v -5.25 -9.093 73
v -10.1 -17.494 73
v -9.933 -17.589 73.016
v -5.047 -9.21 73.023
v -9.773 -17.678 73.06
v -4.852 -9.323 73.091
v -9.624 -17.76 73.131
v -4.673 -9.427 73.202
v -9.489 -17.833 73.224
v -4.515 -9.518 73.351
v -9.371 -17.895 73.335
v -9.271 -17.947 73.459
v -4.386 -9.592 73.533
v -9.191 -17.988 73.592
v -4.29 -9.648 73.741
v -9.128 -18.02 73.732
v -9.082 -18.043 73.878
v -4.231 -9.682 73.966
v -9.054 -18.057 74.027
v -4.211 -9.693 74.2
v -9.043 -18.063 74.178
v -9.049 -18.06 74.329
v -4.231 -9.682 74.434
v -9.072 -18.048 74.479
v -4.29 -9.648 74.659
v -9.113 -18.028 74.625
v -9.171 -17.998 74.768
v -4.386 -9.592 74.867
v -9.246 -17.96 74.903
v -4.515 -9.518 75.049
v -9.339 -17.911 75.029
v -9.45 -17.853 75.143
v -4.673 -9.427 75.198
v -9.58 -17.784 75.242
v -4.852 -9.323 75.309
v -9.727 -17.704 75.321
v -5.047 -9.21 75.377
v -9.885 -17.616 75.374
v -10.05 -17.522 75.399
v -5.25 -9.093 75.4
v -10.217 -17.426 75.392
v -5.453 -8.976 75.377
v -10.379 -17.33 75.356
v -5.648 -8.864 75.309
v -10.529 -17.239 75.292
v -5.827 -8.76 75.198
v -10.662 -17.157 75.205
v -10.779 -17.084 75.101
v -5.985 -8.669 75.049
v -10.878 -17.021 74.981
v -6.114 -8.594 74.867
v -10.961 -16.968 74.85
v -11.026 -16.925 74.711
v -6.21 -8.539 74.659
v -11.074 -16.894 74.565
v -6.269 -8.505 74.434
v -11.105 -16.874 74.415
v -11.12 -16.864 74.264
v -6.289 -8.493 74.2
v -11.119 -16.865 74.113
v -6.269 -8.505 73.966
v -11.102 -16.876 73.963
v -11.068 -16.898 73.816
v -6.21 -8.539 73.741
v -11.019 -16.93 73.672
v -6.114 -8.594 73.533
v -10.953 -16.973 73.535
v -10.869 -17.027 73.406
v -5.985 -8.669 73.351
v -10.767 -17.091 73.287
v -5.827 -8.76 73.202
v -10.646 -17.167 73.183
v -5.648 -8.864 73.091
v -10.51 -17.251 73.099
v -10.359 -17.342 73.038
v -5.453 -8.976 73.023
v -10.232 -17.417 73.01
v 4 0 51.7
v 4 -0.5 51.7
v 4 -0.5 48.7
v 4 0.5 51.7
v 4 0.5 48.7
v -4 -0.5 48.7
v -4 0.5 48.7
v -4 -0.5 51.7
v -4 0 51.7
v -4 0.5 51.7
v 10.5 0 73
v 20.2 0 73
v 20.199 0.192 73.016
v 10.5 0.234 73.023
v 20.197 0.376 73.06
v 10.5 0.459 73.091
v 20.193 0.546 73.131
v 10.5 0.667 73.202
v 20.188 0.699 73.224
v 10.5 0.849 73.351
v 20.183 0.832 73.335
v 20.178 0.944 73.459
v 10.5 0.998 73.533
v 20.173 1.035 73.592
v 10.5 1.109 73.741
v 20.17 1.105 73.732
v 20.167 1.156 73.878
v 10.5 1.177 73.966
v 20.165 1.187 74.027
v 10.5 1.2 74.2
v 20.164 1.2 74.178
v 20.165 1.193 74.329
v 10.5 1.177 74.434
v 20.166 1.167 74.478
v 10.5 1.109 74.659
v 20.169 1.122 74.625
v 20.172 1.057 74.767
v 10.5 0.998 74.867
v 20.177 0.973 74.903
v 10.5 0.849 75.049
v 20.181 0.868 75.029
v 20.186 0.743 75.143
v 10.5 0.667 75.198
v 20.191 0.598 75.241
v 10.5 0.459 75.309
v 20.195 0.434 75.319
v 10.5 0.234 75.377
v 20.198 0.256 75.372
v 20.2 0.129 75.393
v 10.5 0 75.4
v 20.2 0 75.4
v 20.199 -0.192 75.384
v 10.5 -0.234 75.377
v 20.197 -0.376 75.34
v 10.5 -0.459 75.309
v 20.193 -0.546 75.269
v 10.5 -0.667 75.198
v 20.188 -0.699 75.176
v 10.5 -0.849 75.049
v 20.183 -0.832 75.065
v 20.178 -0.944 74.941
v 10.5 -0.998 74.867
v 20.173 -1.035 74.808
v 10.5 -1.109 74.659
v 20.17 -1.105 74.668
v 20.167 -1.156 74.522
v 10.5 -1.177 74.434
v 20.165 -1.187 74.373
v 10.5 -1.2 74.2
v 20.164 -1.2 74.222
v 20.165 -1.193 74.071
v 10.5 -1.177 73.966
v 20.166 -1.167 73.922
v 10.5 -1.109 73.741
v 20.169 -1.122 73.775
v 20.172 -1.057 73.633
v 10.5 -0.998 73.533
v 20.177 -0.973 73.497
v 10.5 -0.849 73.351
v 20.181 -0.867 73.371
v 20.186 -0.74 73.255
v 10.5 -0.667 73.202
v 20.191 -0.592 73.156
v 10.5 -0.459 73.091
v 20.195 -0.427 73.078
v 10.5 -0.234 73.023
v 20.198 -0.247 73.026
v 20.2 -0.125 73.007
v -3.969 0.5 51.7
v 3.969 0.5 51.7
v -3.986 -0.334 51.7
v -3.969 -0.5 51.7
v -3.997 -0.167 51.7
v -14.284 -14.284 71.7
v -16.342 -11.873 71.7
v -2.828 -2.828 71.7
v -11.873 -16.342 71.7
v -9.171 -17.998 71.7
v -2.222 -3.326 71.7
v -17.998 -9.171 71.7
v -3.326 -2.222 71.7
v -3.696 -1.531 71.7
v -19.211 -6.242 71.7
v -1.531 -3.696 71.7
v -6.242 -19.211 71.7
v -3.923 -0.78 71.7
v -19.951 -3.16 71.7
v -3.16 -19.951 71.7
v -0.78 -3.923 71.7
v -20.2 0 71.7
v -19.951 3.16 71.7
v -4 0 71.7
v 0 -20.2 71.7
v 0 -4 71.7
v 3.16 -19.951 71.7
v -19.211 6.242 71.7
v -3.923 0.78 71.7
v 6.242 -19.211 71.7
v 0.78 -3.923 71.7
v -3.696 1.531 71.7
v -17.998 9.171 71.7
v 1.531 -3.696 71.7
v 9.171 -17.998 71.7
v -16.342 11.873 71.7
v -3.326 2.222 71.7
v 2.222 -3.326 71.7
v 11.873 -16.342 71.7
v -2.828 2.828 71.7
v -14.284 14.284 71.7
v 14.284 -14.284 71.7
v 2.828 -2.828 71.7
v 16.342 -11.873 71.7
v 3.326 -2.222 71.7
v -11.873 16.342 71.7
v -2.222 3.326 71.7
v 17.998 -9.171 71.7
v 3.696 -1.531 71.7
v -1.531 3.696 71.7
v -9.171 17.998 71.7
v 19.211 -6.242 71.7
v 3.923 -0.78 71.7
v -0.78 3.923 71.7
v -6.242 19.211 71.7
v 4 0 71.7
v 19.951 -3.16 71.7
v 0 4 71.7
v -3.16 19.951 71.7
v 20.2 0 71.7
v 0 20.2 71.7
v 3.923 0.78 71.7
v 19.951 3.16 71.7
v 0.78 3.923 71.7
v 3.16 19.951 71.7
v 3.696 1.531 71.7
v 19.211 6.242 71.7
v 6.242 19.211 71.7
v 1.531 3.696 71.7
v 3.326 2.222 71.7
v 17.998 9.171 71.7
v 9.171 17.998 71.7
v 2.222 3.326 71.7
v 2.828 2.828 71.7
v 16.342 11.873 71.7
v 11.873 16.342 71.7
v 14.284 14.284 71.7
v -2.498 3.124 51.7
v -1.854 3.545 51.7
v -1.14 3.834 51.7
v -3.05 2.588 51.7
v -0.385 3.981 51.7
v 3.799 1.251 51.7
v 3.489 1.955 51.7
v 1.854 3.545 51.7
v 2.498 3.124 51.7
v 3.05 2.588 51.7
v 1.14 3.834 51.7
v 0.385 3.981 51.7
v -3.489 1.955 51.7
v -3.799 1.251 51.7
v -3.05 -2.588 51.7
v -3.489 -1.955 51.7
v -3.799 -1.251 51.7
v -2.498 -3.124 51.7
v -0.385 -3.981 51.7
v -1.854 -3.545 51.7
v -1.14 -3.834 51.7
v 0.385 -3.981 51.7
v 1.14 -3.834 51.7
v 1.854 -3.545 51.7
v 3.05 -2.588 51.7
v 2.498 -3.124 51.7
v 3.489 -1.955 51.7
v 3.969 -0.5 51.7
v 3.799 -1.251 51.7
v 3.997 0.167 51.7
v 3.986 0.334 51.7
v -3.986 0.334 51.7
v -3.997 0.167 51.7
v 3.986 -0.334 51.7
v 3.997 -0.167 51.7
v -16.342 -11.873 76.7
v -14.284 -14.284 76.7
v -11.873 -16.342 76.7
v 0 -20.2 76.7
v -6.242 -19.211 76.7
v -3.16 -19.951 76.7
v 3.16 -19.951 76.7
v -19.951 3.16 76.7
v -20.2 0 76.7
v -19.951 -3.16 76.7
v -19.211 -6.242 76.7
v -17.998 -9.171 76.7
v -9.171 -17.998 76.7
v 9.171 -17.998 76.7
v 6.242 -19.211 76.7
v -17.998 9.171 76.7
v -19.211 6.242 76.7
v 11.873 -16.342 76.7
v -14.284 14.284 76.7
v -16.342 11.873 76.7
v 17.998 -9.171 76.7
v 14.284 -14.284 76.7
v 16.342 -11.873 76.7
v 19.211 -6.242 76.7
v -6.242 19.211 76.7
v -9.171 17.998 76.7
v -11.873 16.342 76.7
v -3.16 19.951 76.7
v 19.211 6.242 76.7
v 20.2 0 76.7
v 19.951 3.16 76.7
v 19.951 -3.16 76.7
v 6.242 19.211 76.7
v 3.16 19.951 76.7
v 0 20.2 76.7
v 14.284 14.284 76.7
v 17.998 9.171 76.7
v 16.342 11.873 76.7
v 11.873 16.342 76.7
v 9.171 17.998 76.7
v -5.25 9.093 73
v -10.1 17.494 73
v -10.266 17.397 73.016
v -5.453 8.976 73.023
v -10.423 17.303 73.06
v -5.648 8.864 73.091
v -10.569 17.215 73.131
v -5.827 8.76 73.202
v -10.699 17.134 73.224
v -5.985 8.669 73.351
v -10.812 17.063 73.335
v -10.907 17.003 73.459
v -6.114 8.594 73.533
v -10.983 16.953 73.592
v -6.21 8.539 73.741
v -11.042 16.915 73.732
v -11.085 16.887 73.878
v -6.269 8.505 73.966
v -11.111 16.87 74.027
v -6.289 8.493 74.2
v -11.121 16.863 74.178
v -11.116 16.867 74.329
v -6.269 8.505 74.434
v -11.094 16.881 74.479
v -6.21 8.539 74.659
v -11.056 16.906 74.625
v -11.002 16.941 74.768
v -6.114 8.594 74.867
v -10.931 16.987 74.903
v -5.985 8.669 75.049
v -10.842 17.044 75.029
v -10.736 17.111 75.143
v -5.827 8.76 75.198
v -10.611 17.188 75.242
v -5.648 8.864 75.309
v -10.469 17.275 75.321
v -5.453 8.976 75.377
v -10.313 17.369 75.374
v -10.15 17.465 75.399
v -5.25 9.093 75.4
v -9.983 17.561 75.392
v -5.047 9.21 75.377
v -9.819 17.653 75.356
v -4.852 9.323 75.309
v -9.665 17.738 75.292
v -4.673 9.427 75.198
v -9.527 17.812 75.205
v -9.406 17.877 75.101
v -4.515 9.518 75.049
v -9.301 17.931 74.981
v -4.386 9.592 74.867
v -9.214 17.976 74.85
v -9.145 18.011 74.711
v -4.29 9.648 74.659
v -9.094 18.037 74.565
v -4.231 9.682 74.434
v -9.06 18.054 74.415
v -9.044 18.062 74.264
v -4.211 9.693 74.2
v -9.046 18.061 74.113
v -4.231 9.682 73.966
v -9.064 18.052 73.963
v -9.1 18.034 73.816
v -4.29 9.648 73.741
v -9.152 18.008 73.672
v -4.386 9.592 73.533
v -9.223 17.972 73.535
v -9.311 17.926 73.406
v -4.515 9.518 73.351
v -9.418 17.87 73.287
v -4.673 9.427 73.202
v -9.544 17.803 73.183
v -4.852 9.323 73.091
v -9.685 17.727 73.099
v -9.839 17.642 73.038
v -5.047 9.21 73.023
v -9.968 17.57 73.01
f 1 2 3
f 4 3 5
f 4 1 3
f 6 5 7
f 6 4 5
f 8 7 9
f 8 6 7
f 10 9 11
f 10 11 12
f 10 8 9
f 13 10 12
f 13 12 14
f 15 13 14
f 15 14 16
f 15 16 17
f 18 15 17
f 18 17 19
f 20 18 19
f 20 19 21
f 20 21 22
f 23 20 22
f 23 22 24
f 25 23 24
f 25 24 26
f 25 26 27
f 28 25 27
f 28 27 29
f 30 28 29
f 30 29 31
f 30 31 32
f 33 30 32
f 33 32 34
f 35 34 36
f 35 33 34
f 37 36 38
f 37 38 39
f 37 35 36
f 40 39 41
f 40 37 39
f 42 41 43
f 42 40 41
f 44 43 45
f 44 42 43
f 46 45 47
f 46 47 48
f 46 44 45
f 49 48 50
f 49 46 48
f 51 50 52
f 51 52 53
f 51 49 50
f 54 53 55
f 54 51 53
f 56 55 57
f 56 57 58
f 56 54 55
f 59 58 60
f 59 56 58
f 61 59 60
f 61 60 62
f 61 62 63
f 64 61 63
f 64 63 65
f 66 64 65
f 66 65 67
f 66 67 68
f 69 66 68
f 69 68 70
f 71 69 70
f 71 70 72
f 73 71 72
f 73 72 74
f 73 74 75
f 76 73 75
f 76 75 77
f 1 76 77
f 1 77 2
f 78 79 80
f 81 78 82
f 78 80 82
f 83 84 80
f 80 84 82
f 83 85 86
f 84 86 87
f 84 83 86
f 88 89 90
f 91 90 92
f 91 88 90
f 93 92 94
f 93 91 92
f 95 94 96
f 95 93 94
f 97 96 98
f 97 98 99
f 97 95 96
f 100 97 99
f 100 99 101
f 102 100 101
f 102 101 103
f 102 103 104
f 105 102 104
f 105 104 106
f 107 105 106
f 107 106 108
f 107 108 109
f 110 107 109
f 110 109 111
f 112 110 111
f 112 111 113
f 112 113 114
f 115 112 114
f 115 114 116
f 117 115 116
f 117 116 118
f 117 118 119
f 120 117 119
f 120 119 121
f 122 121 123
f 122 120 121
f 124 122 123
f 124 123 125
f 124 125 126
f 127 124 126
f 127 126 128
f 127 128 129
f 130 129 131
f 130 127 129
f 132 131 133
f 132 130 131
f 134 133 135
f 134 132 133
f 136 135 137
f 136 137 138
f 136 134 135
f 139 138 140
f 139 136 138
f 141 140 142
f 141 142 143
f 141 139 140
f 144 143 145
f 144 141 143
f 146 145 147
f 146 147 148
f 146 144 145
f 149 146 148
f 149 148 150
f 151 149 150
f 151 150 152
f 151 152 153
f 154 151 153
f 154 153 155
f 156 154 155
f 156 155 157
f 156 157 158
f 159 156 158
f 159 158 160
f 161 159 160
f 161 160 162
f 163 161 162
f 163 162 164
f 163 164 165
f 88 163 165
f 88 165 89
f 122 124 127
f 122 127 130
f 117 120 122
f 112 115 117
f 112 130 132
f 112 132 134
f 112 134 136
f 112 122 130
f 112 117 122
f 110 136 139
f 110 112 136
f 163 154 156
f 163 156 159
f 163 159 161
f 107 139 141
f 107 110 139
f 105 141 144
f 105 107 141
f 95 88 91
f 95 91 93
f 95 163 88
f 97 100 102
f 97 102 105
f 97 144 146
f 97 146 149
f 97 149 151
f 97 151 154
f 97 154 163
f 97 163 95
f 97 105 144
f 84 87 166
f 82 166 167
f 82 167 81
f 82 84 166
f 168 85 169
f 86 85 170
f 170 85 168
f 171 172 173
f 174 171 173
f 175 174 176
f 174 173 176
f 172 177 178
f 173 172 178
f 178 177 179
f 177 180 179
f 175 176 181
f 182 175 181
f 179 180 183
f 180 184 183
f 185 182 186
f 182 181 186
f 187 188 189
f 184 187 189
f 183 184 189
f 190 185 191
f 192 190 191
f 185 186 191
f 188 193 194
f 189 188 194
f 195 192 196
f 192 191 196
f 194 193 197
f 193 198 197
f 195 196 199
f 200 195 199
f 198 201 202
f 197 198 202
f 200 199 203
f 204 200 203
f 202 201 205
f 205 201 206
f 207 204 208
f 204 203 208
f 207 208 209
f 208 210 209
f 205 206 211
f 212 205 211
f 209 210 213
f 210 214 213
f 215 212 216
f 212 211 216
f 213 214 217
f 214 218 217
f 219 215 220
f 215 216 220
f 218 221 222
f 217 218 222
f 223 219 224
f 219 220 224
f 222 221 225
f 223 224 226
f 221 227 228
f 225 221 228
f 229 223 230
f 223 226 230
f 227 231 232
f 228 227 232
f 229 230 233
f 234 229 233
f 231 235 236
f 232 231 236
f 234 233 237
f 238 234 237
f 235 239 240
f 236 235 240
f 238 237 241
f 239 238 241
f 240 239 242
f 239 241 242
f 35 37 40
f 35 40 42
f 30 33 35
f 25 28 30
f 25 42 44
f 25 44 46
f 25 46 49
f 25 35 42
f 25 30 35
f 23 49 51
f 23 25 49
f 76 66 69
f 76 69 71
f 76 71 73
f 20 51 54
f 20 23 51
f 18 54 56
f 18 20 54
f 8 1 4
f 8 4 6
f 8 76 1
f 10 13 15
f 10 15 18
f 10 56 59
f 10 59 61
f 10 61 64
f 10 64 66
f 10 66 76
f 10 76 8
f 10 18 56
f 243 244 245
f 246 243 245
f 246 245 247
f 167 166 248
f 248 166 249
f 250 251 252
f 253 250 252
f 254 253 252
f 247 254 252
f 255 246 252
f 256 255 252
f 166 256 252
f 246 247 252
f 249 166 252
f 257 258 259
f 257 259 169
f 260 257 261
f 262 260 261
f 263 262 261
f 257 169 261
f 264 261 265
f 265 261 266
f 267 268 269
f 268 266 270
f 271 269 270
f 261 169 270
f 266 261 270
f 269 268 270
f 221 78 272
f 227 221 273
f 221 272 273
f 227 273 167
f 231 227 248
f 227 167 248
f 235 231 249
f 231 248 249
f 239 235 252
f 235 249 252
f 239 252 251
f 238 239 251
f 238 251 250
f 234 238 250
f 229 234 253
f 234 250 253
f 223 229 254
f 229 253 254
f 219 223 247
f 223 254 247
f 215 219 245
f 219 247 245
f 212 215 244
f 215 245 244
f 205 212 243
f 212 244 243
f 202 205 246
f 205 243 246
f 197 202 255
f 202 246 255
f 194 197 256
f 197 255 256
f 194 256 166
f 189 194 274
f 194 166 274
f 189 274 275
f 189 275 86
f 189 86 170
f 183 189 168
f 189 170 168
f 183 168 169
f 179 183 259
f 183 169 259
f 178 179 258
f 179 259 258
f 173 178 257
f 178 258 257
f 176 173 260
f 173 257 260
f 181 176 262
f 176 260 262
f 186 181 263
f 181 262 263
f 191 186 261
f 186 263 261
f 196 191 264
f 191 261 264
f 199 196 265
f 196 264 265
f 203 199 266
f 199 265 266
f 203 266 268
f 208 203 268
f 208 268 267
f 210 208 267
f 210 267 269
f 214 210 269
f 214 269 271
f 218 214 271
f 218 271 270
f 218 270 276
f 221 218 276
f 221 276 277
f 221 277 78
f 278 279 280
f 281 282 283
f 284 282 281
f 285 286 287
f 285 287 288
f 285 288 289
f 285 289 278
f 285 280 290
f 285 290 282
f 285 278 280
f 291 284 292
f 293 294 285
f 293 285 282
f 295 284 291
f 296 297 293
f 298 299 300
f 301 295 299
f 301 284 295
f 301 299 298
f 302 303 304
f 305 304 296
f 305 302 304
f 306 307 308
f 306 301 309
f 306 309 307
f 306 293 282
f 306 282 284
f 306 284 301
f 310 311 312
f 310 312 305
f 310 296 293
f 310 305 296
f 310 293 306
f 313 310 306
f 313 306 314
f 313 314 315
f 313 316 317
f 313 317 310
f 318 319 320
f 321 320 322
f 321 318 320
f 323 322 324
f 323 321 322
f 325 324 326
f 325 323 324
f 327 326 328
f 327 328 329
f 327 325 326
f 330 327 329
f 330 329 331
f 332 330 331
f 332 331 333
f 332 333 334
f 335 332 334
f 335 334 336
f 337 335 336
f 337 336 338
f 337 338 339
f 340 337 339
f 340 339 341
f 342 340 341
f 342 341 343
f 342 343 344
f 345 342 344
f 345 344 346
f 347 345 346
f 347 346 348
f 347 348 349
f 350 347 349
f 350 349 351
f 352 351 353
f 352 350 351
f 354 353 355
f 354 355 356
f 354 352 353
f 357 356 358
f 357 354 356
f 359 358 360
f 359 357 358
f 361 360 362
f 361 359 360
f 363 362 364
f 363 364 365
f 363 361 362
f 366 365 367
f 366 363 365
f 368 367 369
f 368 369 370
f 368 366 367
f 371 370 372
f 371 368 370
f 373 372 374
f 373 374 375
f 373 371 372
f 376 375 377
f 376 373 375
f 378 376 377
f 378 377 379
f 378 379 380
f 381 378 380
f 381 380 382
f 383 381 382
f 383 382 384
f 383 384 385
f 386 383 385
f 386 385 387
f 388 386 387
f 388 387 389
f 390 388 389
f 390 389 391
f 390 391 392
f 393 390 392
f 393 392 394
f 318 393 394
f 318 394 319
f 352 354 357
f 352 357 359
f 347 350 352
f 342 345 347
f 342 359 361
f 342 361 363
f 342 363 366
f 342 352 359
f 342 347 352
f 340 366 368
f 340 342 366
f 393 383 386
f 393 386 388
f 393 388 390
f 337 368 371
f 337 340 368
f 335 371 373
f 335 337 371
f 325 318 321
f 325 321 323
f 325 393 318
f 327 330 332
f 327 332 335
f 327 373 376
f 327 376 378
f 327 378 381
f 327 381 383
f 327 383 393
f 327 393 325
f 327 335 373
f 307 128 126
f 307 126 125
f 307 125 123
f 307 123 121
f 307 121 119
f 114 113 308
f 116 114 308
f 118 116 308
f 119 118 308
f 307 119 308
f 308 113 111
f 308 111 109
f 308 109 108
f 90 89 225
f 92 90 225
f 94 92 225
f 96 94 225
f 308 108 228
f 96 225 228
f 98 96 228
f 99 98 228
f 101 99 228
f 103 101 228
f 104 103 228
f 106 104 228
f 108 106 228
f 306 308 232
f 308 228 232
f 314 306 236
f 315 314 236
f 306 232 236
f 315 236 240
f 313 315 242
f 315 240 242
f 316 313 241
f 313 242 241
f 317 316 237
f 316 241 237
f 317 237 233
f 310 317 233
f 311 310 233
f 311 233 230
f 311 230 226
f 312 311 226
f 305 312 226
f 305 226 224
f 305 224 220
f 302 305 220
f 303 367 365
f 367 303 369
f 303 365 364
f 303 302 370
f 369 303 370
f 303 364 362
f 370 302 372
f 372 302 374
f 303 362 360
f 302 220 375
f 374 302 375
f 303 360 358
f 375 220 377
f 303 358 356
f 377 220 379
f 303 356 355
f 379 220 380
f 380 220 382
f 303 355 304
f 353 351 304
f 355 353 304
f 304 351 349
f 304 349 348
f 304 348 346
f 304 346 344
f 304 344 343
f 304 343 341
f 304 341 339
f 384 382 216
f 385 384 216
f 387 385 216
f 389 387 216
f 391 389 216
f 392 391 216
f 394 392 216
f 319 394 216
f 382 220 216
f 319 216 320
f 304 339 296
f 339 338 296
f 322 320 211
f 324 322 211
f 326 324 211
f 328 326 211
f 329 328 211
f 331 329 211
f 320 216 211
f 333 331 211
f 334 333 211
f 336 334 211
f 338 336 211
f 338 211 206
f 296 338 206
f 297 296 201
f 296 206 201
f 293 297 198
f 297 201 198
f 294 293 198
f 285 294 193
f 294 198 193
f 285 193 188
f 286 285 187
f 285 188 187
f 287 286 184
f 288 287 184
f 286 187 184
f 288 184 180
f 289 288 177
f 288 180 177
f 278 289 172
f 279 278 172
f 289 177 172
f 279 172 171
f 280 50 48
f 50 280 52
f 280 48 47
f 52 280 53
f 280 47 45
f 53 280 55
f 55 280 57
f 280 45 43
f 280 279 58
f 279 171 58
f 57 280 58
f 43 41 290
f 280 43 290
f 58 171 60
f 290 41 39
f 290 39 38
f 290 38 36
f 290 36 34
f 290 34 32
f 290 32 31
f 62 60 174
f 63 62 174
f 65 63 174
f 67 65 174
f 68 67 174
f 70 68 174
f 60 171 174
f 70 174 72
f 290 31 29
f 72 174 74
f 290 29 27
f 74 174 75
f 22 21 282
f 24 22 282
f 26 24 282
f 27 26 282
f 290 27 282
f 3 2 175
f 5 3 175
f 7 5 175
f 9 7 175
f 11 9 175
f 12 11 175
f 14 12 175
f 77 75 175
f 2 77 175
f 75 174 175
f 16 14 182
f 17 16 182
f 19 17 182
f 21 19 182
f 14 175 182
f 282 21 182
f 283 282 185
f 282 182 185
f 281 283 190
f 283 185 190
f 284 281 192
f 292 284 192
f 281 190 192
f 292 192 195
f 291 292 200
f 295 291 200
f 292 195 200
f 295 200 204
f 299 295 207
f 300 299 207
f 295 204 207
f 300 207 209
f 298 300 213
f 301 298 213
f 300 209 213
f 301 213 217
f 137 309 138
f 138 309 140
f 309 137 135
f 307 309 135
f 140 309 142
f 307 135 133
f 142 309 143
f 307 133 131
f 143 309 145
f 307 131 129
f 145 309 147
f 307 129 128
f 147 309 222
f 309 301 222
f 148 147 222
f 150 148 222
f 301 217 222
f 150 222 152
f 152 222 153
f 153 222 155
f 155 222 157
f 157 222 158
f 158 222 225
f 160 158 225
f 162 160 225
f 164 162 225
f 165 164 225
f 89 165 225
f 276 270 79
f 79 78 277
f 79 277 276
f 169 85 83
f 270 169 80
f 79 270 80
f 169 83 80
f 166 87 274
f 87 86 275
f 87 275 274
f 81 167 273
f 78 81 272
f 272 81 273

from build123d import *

# Parameters (mm, degrees)
CYLINDER060_R     = 1.2
CYLINDER060_DEPTH = 10
ARRAY013_COUNT    = 3
CYLINDER061_R     = 4
CYLINDER061_DEPTH = 20
BOX014_W          = 8
BOX014_H          = 1
BOX014_DEPTH      = 3
CYLINDER059_R     = 20.2
CYLINDER059_DEPTH = 5


with BuildPart() as pos_plate_screws:
    # Cylinder060 → Cylinder060 (new body)
    with BuildSketch(Plane(origin=(10.5, 0, 74.2), x_dir=(0, 0, -1), z_dir=(1, 0, 0))):
        Circle(CYLINDER060_R)
    extrude(amount=CYLINDER060_DEPTH)

    # Array013: pos-plate-screws ×3 about axis
    array013_axis = Axis((0, 0, 0), (0, 0, 1))


with BuildPart() as pos_plate_screws_1:
    add(pos_plate_screws.part)
    for i in range(1, ARRAY013_COUNT):
        add(pos_plate_screws.part.rotate(array013_axis, i * 360 / ARRAY013_COUNT))


with BuildPart() as pos_cylinder:
    # Cylinder061 → Cylinder061 (new body)
    with BuildSketch(Plane.XY.offset(51.7)):
        Circle(CYLINDER061_R)
    extrude(amount=CYLINDER061_DEPTH)


with BuildPart() as pos_pick:
    # Box014 → Box014 (new body)
    with BuildSketch(Plane(origin=(-4, -0.5, 48.7), x_dir=(1, 0, 0), z_dir=(0, 0, 1))):
        with Locations((4, 0.5)):
            Rectangle(BOX014_W, BOX014_H)
    extrude(amount=BOX014_DEPTH)


with BuildPart() as turret_pos_pick:
    # Cylinder059 → Cylinder059 (new body)
    with BuildSketch(Plane.XY.offset(71.7)):
        Circle(CYLINDER059_R)
    extrude(amount=CYLINDER059_DEPTH)

    # Fusion026: union pos-cylinder, pos-pick
    add(pos_cylinder.part)
    add(pos_pick.part)

    # Cut048: cut pos-plate-screws
    add(pos_plate_screws_1.part, mode=Mode.SUBTRACT)


solid = turret_pos_pick.part
